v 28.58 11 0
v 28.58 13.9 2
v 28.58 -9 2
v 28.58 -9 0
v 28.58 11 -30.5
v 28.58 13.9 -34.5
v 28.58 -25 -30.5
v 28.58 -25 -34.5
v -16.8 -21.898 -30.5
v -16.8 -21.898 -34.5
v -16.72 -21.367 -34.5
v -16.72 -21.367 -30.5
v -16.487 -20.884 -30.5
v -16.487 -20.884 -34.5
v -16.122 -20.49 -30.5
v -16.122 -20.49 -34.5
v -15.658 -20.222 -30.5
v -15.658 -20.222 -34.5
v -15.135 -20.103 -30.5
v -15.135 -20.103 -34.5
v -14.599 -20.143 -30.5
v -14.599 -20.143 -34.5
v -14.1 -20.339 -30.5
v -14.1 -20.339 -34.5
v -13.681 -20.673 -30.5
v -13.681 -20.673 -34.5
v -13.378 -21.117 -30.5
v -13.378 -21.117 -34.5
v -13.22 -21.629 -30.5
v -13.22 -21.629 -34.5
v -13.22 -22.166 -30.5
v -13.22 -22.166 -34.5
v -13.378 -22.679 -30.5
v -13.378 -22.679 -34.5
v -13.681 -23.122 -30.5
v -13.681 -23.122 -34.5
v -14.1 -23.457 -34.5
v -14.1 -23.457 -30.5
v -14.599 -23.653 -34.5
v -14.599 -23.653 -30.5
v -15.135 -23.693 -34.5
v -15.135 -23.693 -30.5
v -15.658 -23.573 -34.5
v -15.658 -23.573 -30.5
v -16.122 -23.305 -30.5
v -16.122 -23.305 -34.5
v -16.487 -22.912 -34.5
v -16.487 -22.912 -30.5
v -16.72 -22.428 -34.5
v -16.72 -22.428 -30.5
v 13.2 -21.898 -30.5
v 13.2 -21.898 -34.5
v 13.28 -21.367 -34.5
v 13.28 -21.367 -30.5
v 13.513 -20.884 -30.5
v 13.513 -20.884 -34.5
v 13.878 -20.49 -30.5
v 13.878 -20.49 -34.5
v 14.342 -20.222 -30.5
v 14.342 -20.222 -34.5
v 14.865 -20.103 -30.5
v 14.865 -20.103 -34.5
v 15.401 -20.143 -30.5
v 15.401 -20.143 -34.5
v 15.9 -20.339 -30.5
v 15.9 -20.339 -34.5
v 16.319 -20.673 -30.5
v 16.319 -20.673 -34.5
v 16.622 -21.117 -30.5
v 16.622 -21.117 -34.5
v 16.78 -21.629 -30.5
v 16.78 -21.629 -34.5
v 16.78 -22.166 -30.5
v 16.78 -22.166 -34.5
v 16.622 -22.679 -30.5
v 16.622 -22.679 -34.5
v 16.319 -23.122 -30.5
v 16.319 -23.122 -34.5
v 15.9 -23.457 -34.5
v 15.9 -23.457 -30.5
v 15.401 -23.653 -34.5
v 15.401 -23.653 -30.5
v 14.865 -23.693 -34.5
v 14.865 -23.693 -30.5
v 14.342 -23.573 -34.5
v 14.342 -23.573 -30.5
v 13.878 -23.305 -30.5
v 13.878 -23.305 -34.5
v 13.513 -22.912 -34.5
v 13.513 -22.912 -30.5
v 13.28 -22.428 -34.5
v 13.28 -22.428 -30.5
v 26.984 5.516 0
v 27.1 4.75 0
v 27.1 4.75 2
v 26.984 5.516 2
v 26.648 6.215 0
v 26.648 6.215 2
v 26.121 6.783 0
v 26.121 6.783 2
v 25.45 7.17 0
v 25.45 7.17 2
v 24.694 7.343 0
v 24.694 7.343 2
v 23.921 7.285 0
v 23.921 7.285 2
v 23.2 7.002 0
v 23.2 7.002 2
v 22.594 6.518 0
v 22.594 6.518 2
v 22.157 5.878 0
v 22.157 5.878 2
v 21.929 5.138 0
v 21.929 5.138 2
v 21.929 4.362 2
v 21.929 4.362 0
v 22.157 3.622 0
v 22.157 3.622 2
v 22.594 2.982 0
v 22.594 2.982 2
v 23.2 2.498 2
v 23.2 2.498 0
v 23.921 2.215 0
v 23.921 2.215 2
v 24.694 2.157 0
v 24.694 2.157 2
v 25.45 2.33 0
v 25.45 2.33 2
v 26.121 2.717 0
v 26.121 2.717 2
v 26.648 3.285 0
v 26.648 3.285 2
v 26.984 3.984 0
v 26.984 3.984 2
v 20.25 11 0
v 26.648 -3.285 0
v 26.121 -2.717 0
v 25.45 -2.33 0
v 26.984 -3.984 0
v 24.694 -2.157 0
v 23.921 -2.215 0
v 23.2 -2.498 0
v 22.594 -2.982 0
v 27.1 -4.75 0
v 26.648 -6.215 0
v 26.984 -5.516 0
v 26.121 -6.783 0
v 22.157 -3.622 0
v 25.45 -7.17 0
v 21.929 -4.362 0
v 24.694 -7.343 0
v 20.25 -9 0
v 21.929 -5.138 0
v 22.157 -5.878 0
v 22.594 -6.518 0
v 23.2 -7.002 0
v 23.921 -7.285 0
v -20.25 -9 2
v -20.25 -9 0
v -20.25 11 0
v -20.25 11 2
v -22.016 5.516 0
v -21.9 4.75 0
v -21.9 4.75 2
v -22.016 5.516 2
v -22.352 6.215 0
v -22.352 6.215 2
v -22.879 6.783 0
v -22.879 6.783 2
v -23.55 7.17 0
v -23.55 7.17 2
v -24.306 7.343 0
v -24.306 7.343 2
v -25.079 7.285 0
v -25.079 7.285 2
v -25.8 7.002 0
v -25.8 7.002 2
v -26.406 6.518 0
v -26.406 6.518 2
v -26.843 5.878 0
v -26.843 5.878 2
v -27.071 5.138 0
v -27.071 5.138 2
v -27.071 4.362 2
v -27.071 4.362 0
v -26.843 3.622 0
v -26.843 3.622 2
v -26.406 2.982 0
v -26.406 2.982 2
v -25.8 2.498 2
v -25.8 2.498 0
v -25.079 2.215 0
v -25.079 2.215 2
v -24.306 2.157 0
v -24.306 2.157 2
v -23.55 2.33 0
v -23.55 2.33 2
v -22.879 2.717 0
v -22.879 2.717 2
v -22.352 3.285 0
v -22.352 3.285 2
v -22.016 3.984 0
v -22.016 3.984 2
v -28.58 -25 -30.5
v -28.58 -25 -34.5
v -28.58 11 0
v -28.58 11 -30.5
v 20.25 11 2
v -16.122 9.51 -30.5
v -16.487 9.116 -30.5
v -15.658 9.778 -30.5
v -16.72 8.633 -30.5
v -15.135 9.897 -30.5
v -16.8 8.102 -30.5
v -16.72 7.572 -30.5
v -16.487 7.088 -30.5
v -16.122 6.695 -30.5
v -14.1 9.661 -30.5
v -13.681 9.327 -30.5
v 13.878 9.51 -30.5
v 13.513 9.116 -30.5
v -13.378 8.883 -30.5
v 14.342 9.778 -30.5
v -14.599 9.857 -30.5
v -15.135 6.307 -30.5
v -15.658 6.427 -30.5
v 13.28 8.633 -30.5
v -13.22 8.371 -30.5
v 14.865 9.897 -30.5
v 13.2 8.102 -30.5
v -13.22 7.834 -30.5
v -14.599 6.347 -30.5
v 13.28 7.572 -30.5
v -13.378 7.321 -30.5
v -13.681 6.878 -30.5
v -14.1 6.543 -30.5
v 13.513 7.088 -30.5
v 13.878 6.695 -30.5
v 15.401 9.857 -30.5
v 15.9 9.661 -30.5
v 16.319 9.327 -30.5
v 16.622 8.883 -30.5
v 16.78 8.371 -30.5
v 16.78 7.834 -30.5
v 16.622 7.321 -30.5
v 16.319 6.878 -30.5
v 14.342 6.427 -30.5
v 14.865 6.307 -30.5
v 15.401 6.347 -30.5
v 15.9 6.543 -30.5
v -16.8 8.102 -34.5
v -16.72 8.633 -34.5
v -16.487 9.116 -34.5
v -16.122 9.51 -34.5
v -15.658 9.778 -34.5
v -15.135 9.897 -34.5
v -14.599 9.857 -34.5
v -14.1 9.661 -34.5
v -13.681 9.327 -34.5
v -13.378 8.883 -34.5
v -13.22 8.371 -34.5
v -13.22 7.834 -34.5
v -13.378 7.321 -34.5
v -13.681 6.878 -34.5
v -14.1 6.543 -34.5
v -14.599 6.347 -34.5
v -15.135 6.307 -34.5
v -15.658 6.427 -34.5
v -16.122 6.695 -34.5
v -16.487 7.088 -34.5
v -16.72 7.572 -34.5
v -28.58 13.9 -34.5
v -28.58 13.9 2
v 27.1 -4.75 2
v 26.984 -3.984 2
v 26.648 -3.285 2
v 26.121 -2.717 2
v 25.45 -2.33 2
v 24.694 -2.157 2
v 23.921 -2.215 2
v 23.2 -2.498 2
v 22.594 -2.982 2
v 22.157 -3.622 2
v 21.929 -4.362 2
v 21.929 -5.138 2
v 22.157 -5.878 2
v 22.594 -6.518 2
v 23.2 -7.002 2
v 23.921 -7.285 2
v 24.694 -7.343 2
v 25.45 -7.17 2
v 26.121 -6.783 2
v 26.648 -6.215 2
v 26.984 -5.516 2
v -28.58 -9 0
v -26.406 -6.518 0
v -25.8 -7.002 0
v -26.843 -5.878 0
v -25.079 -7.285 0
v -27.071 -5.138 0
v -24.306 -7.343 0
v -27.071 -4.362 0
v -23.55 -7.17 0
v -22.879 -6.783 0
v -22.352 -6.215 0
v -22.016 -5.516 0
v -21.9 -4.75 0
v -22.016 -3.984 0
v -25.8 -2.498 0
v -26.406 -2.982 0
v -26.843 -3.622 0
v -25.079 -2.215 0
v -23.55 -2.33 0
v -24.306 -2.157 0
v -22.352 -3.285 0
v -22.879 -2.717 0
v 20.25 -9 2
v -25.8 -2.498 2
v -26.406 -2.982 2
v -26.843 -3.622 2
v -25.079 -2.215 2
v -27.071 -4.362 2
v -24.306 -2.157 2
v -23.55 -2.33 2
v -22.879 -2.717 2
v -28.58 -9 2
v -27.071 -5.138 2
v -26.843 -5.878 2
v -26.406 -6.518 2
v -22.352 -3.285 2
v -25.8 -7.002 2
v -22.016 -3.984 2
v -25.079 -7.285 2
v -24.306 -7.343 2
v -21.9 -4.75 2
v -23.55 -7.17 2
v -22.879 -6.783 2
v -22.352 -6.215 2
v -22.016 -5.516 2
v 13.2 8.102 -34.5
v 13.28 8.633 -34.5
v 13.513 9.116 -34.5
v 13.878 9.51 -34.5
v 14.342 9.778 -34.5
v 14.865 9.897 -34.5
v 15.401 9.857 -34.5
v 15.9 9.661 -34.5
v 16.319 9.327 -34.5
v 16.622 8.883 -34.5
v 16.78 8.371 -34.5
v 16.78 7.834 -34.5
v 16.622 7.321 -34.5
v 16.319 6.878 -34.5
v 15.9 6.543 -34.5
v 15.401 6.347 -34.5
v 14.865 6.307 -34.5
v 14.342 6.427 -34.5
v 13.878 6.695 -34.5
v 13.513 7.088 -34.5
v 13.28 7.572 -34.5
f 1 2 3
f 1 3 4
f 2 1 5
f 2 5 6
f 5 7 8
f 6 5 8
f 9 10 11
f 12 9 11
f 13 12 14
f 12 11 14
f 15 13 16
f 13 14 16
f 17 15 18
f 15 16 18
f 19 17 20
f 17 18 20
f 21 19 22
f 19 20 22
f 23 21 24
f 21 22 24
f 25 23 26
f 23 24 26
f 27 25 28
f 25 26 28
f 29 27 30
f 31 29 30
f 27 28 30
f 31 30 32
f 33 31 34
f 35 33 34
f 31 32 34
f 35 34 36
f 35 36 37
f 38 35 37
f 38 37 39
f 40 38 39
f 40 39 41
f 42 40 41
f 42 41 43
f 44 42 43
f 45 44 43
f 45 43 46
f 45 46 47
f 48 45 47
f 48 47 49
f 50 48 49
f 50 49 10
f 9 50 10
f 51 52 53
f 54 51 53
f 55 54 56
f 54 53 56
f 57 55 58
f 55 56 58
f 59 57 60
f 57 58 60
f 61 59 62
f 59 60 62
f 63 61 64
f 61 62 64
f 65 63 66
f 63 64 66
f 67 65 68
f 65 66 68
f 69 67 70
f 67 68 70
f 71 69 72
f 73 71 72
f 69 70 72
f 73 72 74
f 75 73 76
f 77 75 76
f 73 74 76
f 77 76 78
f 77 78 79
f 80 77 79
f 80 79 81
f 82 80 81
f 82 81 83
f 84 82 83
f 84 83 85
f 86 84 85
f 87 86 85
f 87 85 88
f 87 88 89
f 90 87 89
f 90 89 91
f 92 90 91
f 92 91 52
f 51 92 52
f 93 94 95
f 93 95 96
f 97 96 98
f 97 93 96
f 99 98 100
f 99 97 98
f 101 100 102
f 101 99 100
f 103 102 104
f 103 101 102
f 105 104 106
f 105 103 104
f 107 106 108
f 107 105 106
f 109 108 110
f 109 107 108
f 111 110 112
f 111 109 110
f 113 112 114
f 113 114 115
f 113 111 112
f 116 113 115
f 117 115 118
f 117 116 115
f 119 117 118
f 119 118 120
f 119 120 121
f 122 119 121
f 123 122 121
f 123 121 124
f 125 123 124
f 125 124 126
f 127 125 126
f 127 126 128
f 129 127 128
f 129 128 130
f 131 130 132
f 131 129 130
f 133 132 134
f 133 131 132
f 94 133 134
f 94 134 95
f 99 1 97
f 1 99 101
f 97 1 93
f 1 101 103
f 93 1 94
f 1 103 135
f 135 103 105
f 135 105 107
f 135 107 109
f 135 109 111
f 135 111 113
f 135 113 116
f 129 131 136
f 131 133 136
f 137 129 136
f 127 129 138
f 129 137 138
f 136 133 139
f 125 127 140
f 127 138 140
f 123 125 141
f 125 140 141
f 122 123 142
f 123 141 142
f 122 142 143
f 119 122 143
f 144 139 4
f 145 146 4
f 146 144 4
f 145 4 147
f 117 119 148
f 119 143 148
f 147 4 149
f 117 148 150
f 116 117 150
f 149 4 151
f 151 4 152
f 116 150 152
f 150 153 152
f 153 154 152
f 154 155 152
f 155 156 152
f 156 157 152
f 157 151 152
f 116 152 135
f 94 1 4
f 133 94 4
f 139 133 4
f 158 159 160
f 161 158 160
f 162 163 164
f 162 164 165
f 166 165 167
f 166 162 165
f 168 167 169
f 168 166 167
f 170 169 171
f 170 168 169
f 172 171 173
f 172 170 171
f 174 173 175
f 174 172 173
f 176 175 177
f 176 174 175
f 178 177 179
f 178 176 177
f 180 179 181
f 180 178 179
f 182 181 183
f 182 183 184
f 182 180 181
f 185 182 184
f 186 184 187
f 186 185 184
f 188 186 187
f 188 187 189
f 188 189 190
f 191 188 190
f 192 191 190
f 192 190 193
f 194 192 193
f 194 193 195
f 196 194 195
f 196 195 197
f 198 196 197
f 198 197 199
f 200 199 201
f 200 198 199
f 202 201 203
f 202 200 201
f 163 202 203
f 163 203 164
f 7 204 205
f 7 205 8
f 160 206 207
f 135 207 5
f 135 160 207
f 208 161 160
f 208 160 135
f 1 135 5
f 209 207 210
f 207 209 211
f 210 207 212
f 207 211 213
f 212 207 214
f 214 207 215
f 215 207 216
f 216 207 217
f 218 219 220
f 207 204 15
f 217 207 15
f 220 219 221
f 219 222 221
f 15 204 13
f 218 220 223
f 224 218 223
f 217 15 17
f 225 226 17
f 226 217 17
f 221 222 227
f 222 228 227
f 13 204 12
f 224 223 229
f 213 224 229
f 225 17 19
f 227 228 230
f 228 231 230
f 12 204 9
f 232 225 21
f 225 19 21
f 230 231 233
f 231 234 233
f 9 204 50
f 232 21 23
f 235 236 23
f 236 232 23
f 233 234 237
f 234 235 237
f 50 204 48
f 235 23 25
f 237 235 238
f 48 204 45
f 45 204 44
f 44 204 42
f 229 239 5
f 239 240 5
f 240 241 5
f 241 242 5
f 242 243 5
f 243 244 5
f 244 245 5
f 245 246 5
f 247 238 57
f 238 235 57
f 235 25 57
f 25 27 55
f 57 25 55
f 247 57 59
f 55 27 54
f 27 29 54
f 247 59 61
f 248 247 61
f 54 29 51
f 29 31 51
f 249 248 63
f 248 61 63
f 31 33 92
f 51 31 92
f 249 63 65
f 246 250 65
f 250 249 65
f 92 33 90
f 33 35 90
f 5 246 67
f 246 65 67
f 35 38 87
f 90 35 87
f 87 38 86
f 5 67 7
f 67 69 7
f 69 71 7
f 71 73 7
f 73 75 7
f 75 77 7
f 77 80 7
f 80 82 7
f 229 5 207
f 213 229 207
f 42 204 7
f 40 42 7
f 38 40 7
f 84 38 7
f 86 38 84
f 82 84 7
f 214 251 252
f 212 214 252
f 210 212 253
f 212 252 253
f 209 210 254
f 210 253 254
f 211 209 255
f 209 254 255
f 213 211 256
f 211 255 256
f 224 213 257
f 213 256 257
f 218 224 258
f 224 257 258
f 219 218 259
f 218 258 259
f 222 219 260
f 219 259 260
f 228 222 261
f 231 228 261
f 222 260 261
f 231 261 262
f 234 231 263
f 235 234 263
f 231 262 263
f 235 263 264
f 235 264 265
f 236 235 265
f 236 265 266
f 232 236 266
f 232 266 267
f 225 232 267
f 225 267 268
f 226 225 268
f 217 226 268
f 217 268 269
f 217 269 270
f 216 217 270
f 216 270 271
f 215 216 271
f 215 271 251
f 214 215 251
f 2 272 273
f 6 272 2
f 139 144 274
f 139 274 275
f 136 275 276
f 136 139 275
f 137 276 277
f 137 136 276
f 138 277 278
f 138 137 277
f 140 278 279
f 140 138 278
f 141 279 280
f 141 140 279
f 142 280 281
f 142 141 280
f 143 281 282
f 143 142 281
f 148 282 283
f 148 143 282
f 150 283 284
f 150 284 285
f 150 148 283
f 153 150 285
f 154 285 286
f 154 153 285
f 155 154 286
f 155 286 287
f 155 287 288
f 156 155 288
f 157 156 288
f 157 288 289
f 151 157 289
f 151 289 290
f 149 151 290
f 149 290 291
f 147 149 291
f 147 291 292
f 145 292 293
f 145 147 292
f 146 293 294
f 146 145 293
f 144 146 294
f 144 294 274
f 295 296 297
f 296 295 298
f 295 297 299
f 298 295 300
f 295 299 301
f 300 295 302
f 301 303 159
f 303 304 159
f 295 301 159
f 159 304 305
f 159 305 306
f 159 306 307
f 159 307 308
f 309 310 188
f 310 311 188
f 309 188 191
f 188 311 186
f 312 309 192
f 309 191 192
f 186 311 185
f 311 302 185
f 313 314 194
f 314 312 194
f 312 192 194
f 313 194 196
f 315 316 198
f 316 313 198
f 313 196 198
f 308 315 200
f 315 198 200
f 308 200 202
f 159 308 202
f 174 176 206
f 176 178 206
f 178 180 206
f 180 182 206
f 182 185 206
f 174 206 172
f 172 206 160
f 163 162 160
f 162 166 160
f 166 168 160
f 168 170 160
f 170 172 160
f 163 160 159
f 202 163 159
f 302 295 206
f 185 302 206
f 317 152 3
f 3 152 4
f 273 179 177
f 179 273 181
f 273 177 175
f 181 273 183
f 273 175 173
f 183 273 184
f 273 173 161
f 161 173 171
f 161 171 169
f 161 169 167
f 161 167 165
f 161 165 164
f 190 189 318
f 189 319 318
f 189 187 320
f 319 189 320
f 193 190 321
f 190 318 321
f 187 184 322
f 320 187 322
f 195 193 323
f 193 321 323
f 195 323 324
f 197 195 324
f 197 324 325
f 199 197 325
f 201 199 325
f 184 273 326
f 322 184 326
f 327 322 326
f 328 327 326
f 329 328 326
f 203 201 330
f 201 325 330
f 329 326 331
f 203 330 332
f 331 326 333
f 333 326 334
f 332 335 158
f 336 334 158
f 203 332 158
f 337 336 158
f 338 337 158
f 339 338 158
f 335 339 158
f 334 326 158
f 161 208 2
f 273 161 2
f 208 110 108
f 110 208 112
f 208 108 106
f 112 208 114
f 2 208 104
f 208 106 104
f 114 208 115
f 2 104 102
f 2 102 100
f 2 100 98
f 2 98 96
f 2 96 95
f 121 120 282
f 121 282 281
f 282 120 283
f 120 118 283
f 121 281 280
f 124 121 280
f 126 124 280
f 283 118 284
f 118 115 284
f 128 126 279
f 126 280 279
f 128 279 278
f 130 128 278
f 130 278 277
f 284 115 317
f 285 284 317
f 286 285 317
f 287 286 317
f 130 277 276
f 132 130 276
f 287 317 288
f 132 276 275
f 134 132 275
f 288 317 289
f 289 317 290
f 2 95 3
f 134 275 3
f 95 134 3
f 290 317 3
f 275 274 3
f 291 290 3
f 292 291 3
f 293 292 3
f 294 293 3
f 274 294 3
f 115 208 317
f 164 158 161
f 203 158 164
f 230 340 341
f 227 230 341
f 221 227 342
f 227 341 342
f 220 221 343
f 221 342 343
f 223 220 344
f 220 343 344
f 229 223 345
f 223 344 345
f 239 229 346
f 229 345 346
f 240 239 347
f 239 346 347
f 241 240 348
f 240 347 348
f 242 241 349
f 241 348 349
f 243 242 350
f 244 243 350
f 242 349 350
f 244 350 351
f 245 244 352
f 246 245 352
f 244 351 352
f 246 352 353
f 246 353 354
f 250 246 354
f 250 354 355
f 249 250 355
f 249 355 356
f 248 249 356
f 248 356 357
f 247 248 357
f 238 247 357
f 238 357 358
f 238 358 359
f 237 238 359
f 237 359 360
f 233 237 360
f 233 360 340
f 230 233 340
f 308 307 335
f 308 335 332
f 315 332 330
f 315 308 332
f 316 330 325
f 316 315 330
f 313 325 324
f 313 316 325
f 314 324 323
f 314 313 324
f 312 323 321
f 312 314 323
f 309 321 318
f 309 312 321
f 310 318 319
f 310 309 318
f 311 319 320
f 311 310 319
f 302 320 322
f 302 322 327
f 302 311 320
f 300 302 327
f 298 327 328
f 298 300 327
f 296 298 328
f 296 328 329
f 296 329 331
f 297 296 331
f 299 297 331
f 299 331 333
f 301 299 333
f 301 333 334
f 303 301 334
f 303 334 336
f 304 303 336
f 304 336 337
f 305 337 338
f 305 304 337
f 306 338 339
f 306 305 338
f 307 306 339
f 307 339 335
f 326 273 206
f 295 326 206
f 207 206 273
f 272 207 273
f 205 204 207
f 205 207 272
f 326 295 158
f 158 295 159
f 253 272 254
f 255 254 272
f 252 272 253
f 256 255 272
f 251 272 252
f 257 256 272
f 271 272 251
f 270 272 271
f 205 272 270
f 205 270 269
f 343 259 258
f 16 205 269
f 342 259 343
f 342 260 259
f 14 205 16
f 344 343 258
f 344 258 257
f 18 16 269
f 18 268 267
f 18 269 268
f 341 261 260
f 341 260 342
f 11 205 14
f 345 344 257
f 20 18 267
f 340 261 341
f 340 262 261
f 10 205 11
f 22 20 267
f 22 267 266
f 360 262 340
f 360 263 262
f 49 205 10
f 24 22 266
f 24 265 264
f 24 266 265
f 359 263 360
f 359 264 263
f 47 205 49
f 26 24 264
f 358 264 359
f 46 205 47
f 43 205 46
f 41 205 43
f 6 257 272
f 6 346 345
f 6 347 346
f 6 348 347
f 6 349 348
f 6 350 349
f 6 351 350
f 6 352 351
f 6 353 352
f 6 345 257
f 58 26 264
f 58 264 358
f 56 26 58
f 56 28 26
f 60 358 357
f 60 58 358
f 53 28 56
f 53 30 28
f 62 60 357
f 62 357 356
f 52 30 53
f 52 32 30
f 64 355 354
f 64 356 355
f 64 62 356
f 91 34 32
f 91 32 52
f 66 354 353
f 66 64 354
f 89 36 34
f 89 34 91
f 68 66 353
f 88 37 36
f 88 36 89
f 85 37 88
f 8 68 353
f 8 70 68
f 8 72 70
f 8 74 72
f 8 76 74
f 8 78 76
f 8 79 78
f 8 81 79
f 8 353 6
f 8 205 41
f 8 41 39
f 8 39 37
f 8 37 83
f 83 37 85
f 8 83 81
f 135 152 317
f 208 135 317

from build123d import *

# Parameters (mm, degrees)
SKETCH_1_R           = 2.6
EXTRUDE_3_DEPTH      = 2
EXTRUDE_5_DEPTH      = 18.7
EXTRUDE_5_DEPTH_BACK = 2
SKETCH_9_W           = 57.159649592
SKETCH_9_H           = 11.9
EXTRUDE_6_DEPTH      = 31.5
SKETCH_10_W          = 57.159649592
SKETCH_10_H          = 11.9
EXTRUDE_7_DEPTH      = 5
SKETCH_11_W          = 57.159649592
SKETCH_11_H          = 36.5
CUT_EXTRUDE_1_DEPTH  = 10
SKETCH_12_W          = 57.159649592
SKETCH_12_H          = 4
EXTRUDE_8_DEPTH      = 35
SKETCH_13_R          = 1.8
CUT_EXTRUDE_2_DEPTH  = 10
SKETCH_14_W          = 57.159649592
SKETCH_14_H          = 36.5
EXTRUDE_9_DEPTH      = 2
CUT_EXTRUDE_3_DEPTH  = 1


with BuildPart() as part:
    # 草图1 → 凸台-拉伸3 (new body)
    # profile 1 of 2: a face of its own
    with BuildSketch(Plane.XY):
        Polygon((-28.579824796, -9), (-20.25, -9), (-20.25, 9), (-20.25, 10), (20.25, 10), (20.25, 9), (20.25, -9), (28.579824796, -9), (28.579824796, 12), (-28.579824796, 12), align=None)
        with Locations((-24.5, -4.75)):
            Circle(SKETCH_1_R, mode=Mode.SUBTRACT)
        with Locations((24.5, -4.75)):
            Circle(SKETCH_1_R, mode=Mode.SUBTRACT)
        with Locations((-24.5, 4.75)):
            Circle(SKETCH_1_R, mode=Mode.SUBTRACT)
        with Locations((24.5, 4.75)):
            Circle(SKETCH_1_R, mode=Mode.SUBTRACT)
    # profile 2 of 2: a face of its own
    with BuildSketch(Plane.XY):
        Polygon((-28.579824796, -9), (-20.25, -9), (-20.25, 9), (-20.25, 10), (20.25, 10), (20.25, 9), (20.25, -9), (28.579824796, -9), (28.579824796, 12), (-28.579824796, 12), align=None)
        with Locations((-24.5, -4.75)):
            Circle(SKETCH_1_R, mode=Mode.SUBTRACT)
        with Locations((24.5, -4.75)):
            Circle(SKETCH_1_R, mode=Mode.SUBTRACT)
        with Locations((-24.5, 4.75)):
            Circle(SKETCH_1_R, mode=Mode.SUBTRACT)
        with Locations((24.5, 4.75)):
            Circle(SKETCH_1_R, mode=Mode.SUBTRACT)
    extrude(amount=EXTRUDE_3_DEPTH)

    # 草图3 → 凸台-拉伸5 (add, two sides: drawn at the far end of the back side and taken through both)
    with BuildSketch(Plane(origin=(0, 0, 0), x_dir=(-1, 0, 0), z_dir=(0, 0, -1)).offset(-EXTRUDE_5_DEPTH_BACK)):
        Polygon((-28.579824796, 12), (-28.579824796, 10), (28.579824796, 10), (28.579824796, 12), (28.579824796, 21.9), (-28.579824796, 21.9), align=None)
    extrude(amount=EXTRUDE_5_DEPTH + EXTRUDE_5_DEPTH_BACK)

    # 草图9 → 凸台-拉伸6 (add)
    with BuildSketch(Plane.XY.offset(2)):
        with Locations((0, 15.95)):
            Rectangle(SKETCH_9_W, SKETCH_9_H)
    extrude(amount=-EXTRUDE_6_DEPTH)

    # 草图10 → 凸台-拉伸7 (add)
    with BuildSketch(Plane(origin=(0, 0, -29.5), x_dir=(-1, 0, 0), z_dir=(0, 0, -1))):
        with Locations((0, 15.95)):
            Rectangle(SKETCH_10_W, SKETCH_10_H)
    extrude(amount=EXTRUDE_7_DEPTH)

    # 草图11 → 切除-拉伸1 (cut)
    with BuildSketch(Plane(origin=(0, 21.9, 0), x_dir=(1, 0, 0), z_dir=(0, 1, 0))):
        with Locations((0, 16.25)):
            Rectangle(SKETCH_11_W, SKETCH_11_H)
    extrude(amount=-CUT_EXTRUDE_1_DEPTH, mode=Mode.SUBTRACT)

    # 草图12 → 凸台-拉伸8 (add)
    with BuildSketch(Plane.XZ.offset(-10)):
        with Locations((0, -32.5)):
            Rectangle(SKETCH_12_W, SKETCH_12_H)
    extrude(amount=EXTRUDE_8_DEPTH)

    # 草图13 → 切除-拉伸2 (cut)
    with BuildSketch(Plane(origin=(0, 0, -34.5), x_dir=(-1, 0, 0), z_dir=(0, 0, -1))):
        with Locations((-15, 8.10231344)):
            Circle(SKETCH_13_R)
        with Locations((15, -21.89768656)):
            Circle(SKETCH_13_R)
        with Locations((-15, -21.89768656)):
            Circle(SKETCH_13_R)
        with Locations((15, 8.10231344)):
            Circle(SKETCH_13_R)
    extrude(amount=-CUT_EXTRUDE_2_DEPTH, mode=Mode.SUBTRACT)

    # 草图14 → 凸台-拉伸9 (add)
    with BuildSketch(Plane(origin=(0, 11.9, 0), x_dir=(1, 0, 0), z_dir=(0, 1, 0))):
        with Locations((0, 16.25)):
            Rectangle(SKETCH_14_W, SKETCH_14_H)
    extrude(amount=EXTRUDE_9_DEPTH)

    # 草图15 → 切除-拉伸3 (cut)
    with BuildSketch(Plane.XZ.offset(-10)):
        Polygon((-28.579824796, -30.5), (28.579824796, -30.5), (28.579824796, 0), (20.25, 0), (20.25, 2), (-20.25, 2), (-20.25, 0), (-28.579824796, 0), align=None)
    extrude(amount=-CUT_EXTRUDE_3_DEPTH, mode=Mode.SUBTRACT)


solid = part.part
